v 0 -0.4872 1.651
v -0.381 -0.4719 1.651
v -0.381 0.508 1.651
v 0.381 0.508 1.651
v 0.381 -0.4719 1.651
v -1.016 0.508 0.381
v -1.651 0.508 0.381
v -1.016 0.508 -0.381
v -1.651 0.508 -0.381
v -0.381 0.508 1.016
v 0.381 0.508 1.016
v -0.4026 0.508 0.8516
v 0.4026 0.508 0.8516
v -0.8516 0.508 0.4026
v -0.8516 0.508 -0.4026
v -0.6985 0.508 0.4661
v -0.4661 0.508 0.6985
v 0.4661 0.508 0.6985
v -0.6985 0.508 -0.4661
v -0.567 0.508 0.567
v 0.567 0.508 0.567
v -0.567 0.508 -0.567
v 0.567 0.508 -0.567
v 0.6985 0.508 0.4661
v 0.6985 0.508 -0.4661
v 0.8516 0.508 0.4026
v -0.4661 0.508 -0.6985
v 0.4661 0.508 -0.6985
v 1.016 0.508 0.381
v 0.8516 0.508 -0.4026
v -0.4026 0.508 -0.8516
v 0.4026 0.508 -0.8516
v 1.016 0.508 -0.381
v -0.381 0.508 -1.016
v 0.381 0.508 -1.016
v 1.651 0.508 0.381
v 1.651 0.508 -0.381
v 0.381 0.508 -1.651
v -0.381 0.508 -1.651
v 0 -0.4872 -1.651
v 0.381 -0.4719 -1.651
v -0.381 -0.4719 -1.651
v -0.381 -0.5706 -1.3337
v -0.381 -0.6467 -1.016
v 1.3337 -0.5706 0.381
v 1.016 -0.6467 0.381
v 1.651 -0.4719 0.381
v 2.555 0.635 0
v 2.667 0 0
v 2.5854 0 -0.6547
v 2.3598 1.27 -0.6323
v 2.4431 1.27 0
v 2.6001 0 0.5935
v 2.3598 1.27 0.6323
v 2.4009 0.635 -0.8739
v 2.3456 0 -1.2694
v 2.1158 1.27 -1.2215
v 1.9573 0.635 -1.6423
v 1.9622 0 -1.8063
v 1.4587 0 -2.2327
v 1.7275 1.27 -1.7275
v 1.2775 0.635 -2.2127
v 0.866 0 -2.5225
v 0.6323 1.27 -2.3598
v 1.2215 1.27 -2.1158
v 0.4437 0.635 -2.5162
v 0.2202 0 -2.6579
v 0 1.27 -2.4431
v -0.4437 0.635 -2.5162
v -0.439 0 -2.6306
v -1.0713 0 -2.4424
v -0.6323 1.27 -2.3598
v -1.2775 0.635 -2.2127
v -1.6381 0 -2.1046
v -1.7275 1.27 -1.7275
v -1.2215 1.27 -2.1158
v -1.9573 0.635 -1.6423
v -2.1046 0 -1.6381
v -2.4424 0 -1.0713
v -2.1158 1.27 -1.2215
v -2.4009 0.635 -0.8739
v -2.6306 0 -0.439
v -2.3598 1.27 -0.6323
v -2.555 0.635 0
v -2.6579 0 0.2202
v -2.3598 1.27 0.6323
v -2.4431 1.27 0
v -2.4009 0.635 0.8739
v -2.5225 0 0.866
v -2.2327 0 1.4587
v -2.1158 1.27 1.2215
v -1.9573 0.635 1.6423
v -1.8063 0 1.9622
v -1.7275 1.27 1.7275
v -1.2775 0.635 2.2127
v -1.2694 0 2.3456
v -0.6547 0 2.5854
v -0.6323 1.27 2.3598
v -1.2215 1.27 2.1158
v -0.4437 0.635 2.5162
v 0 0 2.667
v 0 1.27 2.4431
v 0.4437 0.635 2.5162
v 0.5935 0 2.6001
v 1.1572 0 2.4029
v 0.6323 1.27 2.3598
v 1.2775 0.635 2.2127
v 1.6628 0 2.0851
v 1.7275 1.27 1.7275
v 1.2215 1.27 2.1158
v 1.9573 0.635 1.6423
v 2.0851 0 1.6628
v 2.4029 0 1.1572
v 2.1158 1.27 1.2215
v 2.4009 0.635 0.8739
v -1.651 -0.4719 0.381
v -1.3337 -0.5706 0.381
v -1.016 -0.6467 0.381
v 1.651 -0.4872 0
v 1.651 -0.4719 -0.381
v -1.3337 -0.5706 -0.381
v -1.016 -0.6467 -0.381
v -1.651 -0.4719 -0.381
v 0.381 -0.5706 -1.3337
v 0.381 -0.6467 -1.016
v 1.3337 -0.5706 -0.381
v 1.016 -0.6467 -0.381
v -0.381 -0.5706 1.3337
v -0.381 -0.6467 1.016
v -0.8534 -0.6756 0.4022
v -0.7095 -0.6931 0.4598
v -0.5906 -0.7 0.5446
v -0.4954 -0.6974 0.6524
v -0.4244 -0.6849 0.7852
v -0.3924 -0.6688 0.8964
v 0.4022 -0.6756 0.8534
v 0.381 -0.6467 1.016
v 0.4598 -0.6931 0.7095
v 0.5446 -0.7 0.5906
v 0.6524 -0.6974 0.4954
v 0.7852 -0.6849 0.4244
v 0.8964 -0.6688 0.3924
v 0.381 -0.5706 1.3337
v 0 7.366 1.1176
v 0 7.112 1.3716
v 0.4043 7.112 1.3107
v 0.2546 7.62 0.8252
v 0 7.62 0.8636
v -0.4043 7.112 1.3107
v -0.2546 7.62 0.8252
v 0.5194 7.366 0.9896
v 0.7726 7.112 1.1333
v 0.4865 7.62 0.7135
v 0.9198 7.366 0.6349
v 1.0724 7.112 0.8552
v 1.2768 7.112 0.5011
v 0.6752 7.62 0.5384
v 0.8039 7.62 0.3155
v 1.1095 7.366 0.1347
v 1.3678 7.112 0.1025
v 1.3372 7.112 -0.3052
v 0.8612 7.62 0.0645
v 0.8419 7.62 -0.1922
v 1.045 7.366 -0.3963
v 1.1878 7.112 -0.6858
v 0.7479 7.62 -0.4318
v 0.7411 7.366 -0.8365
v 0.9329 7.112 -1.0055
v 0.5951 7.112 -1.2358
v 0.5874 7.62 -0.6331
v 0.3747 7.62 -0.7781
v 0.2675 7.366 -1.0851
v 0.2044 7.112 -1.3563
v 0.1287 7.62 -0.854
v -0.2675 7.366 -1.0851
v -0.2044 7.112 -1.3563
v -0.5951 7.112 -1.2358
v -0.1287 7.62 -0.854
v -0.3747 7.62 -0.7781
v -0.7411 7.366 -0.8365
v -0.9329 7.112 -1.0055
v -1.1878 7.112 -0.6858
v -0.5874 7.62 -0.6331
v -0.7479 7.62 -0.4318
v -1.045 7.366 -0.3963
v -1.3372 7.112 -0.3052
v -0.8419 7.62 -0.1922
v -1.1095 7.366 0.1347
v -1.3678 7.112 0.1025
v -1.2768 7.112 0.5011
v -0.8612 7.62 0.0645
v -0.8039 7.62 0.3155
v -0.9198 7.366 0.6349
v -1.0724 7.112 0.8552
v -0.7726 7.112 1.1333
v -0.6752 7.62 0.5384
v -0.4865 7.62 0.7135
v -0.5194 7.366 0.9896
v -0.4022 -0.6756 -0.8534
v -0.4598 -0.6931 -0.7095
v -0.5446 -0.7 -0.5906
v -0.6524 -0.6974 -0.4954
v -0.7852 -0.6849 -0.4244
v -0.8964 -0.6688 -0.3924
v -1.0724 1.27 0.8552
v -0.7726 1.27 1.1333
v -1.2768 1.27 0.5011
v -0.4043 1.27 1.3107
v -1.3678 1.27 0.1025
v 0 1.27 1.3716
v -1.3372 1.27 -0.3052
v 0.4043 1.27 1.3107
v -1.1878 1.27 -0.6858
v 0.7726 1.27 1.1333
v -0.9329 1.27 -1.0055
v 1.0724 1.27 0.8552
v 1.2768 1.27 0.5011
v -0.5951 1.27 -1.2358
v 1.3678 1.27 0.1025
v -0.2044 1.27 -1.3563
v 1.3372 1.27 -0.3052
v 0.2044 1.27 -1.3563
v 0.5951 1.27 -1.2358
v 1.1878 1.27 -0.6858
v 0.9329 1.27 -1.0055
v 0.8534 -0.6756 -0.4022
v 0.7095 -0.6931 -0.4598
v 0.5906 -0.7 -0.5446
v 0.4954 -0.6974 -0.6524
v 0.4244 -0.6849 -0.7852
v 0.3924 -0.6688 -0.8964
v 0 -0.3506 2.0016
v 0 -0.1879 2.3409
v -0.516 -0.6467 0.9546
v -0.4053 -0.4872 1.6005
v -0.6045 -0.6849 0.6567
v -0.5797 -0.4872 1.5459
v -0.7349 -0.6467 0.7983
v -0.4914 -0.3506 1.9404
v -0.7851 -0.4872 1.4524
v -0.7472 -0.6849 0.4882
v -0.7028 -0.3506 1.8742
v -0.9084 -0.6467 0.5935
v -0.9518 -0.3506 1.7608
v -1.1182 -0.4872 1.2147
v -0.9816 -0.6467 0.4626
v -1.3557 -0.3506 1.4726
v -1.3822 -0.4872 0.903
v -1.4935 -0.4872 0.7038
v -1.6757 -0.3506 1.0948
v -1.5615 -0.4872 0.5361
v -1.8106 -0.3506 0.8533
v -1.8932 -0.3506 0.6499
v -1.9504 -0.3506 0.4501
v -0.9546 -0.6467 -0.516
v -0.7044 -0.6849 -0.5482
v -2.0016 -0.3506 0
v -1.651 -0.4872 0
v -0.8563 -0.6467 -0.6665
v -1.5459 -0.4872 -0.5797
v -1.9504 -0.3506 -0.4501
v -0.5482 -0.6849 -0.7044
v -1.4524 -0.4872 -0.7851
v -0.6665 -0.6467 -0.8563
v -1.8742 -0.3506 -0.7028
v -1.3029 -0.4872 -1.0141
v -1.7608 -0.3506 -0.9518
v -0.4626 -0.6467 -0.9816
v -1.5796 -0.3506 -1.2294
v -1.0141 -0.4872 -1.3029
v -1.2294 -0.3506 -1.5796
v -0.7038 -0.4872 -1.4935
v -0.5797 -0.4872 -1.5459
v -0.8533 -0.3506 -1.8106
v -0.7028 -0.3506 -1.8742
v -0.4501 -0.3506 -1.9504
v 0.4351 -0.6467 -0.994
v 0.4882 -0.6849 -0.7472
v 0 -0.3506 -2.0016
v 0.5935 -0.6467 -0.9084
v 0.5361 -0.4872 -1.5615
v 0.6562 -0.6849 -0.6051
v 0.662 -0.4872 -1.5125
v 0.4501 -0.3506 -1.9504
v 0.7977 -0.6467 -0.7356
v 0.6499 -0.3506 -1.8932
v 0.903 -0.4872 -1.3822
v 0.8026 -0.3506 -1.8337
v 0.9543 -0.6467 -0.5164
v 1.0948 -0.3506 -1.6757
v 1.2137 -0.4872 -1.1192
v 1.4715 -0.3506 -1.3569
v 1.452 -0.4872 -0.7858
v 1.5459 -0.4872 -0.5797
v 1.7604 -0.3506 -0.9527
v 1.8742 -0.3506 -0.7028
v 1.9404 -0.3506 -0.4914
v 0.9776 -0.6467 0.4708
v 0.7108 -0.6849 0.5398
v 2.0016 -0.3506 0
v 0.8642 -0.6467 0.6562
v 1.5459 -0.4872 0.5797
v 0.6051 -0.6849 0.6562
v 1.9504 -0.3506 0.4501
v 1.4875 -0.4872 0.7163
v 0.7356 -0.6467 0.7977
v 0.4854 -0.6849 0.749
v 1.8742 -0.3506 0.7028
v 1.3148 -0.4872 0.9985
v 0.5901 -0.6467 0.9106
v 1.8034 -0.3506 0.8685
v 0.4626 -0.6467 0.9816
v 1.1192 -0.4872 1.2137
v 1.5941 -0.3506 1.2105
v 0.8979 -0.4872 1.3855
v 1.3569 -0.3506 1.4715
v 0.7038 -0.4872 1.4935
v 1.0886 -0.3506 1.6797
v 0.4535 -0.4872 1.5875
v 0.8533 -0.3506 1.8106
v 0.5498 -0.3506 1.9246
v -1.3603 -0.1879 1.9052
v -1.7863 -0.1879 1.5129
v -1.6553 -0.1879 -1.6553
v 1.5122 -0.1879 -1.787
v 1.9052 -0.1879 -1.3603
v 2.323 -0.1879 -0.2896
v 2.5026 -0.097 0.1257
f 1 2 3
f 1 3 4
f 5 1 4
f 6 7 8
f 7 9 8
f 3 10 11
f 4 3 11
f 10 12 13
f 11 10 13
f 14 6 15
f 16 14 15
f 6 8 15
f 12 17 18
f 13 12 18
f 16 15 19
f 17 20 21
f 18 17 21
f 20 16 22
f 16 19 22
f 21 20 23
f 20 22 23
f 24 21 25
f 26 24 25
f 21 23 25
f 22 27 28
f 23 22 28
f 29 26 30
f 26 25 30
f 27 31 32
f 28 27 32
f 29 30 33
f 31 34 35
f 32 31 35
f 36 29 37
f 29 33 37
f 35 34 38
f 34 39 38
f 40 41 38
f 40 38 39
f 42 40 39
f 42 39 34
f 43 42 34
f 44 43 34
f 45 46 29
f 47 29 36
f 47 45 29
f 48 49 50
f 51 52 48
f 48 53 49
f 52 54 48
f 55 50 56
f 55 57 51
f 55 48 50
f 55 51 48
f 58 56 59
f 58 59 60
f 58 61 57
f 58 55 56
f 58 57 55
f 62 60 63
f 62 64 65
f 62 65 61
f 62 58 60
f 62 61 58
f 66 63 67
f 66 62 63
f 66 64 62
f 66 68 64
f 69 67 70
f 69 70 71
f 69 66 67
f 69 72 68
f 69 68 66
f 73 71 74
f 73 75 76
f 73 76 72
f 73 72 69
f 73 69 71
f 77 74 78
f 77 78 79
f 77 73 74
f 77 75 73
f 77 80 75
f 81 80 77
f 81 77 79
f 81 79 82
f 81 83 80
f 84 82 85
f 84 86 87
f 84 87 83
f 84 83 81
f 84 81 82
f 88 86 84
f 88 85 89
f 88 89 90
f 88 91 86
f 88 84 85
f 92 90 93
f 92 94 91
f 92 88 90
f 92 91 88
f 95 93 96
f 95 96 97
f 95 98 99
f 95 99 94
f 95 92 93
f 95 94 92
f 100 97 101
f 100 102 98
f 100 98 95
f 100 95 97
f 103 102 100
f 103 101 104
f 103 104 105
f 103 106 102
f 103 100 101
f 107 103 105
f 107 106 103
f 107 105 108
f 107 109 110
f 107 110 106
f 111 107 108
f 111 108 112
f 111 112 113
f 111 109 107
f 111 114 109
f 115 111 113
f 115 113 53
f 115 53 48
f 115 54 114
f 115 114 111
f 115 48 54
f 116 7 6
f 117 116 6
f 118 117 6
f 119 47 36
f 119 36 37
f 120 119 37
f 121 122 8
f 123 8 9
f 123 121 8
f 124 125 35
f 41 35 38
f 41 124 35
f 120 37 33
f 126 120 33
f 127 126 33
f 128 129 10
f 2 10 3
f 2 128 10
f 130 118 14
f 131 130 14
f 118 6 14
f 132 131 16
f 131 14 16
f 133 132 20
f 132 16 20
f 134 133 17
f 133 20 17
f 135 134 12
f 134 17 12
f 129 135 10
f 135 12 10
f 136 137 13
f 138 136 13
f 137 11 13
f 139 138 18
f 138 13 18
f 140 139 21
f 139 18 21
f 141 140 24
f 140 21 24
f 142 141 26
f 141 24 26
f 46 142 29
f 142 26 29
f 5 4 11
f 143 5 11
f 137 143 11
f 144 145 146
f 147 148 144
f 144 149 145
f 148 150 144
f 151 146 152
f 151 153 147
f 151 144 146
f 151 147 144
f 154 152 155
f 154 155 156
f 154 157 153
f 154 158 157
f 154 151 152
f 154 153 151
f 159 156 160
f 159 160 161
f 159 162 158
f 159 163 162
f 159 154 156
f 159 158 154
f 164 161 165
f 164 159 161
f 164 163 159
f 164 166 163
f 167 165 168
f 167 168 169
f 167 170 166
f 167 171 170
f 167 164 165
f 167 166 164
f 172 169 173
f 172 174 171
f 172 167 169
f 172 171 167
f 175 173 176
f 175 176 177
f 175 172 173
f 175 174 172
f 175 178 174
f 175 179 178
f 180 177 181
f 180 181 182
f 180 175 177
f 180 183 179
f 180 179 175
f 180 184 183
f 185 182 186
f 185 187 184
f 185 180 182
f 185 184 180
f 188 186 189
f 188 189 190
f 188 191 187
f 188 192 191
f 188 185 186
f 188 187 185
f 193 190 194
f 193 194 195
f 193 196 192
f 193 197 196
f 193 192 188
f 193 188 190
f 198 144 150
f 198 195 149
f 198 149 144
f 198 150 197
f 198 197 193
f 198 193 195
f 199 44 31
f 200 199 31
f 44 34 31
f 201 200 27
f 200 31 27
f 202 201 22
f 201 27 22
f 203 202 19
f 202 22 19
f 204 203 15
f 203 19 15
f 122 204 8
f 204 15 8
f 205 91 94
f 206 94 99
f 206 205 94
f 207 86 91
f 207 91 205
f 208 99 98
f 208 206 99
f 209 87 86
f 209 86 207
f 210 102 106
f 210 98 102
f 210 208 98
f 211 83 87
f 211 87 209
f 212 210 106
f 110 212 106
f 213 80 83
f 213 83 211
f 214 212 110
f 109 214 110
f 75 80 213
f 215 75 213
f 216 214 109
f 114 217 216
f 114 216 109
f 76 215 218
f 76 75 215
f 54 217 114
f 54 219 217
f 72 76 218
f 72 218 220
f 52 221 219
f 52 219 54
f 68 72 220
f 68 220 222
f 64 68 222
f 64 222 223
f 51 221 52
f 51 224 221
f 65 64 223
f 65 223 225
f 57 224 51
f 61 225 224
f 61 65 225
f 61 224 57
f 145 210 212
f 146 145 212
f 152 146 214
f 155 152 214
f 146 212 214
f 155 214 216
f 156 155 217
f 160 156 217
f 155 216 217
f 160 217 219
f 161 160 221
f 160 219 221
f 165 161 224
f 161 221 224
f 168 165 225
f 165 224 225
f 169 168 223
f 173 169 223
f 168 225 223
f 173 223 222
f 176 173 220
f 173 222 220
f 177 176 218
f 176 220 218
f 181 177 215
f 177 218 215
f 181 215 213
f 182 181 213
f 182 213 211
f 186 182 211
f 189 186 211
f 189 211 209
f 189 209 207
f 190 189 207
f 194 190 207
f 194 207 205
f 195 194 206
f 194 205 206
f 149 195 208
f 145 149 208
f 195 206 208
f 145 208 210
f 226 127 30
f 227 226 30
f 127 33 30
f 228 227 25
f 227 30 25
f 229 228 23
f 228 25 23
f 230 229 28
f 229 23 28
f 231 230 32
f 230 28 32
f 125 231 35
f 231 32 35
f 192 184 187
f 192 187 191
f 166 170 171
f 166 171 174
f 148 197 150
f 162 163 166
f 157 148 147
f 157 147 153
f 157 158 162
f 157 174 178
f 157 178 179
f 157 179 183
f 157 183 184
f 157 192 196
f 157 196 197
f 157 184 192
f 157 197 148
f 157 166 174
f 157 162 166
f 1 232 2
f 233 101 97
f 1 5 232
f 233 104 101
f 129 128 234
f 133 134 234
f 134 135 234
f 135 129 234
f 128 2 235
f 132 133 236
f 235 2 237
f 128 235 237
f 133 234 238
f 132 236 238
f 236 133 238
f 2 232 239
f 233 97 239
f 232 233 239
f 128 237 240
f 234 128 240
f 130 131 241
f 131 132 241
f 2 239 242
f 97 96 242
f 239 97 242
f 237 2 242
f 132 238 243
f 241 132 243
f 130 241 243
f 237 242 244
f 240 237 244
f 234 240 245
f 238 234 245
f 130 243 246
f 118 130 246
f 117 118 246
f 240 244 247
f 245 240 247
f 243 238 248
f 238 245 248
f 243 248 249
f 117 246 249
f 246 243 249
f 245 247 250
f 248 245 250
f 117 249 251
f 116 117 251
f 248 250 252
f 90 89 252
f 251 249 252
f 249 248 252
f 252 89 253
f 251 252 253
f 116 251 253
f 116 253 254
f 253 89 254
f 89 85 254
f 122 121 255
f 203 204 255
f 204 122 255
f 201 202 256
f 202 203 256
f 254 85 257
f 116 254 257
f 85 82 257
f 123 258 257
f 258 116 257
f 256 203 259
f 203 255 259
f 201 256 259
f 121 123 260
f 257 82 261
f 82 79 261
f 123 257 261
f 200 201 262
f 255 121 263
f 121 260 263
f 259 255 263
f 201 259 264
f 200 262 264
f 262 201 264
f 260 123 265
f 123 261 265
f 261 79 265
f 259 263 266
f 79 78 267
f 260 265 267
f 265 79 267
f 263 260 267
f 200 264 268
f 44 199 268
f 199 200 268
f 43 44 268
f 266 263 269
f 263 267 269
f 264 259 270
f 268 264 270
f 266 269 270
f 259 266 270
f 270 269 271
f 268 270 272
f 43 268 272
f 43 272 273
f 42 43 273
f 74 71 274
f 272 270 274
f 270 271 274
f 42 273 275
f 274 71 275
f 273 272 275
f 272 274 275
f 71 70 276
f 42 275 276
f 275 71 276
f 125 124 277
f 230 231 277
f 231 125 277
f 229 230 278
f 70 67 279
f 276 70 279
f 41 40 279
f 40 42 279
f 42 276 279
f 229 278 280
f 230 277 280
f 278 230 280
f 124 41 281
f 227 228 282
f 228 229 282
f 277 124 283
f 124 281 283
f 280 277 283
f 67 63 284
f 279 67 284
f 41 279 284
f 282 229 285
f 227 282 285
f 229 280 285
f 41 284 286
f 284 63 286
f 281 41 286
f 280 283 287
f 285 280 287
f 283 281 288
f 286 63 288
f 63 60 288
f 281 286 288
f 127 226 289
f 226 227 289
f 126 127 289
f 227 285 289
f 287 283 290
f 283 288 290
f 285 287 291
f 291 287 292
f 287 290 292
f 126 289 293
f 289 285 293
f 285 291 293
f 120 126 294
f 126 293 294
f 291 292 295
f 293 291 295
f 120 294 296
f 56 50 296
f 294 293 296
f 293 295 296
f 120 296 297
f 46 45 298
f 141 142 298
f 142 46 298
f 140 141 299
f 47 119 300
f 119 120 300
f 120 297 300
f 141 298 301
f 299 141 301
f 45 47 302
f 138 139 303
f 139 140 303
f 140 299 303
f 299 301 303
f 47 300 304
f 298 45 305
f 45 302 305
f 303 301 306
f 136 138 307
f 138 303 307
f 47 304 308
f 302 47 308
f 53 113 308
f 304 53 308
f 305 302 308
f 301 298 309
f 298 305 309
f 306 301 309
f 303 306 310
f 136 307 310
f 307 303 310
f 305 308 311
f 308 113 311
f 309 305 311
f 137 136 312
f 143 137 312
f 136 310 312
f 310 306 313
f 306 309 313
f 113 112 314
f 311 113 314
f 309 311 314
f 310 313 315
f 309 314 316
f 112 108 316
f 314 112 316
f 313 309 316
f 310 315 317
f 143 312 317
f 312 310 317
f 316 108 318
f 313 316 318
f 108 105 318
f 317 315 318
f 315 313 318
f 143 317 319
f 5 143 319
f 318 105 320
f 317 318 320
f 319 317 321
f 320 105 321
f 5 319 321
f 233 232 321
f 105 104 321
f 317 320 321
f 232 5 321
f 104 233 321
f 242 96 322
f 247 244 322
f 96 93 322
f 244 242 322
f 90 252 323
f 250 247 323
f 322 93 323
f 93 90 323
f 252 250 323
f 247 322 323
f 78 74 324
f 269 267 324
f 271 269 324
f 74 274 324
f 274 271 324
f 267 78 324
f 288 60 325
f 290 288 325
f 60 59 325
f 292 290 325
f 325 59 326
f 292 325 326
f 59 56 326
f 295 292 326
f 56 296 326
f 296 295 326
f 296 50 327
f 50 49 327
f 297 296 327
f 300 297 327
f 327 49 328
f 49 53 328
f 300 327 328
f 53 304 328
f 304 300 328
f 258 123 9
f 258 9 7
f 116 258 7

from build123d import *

# Parameters (mm, degrees)
SKETCH1_R           = 2.667
BOSS_EXTRUDE1_DEPTH = 1.27
BOSS_EXTRUDE1_TAPER = 10
SKETCH3_R           = 1.3716
BOSS_EXTRUDE2_DEPTH = 6.35
CHAMFER1_SIZE       = 0.508
CUT_EXTRUDE5_DEPTH  = 3.048
FILLET1_R           = 0.635


with BuildPart() as part:
    # Sketch1 → Boss-Extrude1 (new body)
    with BuildSketch(Plane(origin=(0, 0, 0), x_dir=(1, 0, 0), z_dir=(0, 1, 0))):
        Circle(SKETCH1_R)
    extrude(amount=BOSS_EXTRUDE1_DEPTH, taper=BOSS_EXTRUDE1_TAPER)

    # Sketch2 → Revolve1 (revolve)
    with BuildSketch(Plane(origin=(0, 0, 0), x_dir=(0, 0, -1), z_dir=(1, 0, 0))):
        with BuildLine():
            Line((0, 0), (0, -0.762))
            ThreePointArc((0, -0.762), (-1.387624328, -0.57043515), (-2.667, 0))
            Line((-2.667, 0), (0, 0))
        make_face()
    revolve(axis=Axis((0, 0, 0), (0, -1, 0)))

    # Sketch3 → Boss-Extrude2 (add)
    with BuildSketch(Plane(origin=(0, 1.27, 0), x_dir=(1, 0, 0), z_dir=(0, 1, 0))):
        with Locations(Location((0, 0, 0), (0, 0, 270))):
            Circle(SKETCH3_R)
    extrude(amount=BOSS_EXTRUDE2_DEPTH)

    # Chamfer1
    chamfer1_edges = [part.edges().sort_by_distance(p)[0] for p in [
        (0, 7.62, -1.3716),
    ]]
    chamfer(chamfer1_edges, length=CHAMFER1_SIZE)

    # Sketch4 → Cut-Extrude5 (cut)
    with BuildSketch(Plane(origin=(0, -2.54, 0), x_dir=(1, 0, 0), z_dir=(0, 1, 0))):
        Polygon((-1.651, 0.381), (-1.651, -0.381), (-0.381, -0.381), (-0.381, -1.651), (0.381, -1.651), (0.381, -0.381), (1.651, -0.381), (1.651, 0.381), (0.381, 0.381), (0.381, 1.651), (-0.381, 1.651), (-0.381, 0.381), align=None)
    extrude(amount=CUT_EXTRUDE5_DEPTH, mode=Mode.SUBTRACT)

    # Fillet1
    fillet1_edges = [part.edges().sort_by_distance(p)[0] for p in [
        (0.381, -0.113446581, -0.381),
        (-0.381, -0.113446581, -0.381),
        (0.381, -0.113446581, 0.381),
        (-0.381, -0.113446581, 0.381),
    ]]
    fillet(fillet1_edges, radius=FILLET1_R)


solid = part.part
